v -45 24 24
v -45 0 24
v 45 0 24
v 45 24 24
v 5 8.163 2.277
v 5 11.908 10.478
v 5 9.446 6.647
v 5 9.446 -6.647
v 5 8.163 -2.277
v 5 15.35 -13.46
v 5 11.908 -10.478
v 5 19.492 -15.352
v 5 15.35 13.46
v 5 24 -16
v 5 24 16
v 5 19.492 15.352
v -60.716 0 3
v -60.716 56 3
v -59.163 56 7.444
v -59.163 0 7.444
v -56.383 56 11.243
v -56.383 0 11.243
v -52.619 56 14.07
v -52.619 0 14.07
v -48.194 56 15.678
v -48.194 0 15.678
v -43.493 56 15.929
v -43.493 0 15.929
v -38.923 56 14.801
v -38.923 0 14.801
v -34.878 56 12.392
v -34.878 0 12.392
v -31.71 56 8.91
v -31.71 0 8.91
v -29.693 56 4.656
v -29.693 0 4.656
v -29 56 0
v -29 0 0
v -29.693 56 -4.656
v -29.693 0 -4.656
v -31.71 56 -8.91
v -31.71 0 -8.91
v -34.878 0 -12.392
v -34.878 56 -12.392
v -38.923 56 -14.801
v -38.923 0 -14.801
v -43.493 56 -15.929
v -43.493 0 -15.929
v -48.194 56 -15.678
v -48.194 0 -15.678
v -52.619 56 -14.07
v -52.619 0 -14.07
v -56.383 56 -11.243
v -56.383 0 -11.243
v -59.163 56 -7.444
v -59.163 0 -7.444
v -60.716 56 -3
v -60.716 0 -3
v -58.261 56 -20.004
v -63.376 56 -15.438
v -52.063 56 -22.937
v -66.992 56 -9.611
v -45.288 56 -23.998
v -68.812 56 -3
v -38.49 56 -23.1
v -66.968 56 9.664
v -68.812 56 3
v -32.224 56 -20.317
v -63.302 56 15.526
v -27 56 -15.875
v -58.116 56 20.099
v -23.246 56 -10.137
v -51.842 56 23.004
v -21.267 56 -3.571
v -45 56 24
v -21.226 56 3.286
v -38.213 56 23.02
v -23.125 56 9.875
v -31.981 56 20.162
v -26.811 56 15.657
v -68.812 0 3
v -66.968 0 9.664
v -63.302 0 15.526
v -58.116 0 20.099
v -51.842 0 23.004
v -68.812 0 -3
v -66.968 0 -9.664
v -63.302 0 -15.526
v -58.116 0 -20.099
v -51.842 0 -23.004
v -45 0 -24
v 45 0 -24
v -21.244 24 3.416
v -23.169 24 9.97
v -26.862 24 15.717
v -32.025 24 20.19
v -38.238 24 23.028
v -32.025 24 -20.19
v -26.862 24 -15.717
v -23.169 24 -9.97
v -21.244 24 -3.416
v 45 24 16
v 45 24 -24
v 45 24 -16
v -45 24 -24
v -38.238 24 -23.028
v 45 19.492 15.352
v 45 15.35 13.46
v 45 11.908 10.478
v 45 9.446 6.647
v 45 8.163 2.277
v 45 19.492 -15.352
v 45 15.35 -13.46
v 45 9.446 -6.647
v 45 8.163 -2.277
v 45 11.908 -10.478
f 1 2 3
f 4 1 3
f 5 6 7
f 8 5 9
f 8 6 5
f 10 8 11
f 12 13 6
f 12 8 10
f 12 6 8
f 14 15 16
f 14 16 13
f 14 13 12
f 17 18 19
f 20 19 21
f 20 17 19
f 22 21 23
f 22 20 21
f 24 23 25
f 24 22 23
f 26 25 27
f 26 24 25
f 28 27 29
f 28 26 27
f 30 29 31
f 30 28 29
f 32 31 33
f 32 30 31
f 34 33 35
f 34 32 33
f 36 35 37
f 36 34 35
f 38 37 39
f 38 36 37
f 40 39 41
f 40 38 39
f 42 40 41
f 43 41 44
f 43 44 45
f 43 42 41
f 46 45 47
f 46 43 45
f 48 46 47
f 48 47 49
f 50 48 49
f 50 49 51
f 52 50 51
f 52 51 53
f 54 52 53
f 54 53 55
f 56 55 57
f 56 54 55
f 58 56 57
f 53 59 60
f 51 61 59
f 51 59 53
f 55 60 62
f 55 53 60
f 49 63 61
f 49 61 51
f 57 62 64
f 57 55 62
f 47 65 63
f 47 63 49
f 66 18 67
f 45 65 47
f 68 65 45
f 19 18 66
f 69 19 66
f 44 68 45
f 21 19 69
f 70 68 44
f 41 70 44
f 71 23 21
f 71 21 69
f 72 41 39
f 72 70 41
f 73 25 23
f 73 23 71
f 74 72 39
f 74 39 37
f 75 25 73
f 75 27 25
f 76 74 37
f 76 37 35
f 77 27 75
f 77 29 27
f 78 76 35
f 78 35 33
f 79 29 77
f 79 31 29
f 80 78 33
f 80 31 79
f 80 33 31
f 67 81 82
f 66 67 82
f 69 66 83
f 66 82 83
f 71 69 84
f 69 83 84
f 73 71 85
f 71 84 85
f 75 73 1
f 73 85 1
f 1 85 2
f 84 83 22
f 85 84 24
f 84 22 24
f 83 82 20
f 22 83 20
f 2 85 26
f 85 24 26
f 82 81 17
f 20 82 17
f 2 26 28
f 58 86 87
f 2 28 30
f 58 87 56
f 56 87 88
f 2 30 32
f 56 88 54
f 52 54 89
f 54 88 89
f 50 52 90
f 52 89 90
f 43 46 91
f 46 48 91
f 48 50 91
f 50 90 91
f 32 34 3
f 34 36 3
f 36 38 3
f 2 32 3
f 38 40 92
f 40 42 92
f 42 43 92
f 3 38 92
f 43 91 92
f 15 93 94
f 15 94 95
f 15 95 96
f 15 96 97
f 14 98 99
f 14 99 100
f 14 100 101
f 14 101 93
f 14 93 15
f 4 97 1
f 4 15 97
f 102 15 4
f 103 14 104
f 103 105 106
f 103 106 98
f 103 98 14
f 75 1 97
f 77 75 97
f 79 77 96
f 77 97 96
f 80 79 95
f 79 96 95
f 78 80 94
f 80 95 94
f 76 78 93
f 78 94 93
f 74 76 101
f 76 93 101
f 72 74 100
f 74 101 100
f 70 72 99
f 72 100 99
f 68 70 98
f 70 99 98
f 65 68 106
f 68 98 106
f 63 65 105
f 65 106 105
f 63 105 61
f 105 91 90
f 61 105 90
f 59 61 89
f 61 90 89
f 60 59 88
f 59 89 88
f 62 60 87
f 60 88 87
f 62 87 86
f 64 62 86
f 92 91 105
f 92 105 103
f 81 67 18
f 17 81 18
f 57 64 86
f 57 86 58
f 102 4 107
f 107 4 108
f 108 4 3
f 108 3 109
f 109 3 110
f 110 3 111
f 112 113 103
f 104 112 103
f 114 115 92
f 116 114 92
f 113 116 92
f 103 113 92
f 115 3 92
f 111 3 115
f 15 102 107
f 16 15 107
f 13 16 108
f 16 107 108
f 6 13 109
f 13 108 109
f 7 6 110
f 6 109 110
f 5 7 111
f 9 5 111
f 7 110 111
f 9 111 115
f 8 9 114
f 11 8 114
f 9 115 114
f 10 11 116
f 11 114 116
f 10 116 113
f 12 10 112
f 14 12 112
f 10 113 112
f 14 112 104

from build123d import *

# Parameters (mm, degrees)
SKETCH1_W                = 90
SKETCH1_H                = 48
BOSS_EXTRUDE1_DEPTH      = 24
SKETCH8_R                = 16
CUT_EXTRUDE1_DEPTH       = 40
BOSS_EXTRUDE2_DEPTH      = 32
BOSS_EXTRUDE2_DEPTH_BACK = 24
SKETCH9_R                = 24
SKETCH9_R_2              = 16
CUT_EXTRUDE2_DEPTH       = 32
CUT_EXTRUDE2_DEPTH_BACK  = 24
SKETCH10_R               = 16
SKETCH11_W               = 22
SKETCH11_H               = 6
CUT_EXTRUDE3_DEPTH       = 93.048900048


with BuildPart() as part:
    # Sketch1 → Boss-Extrude1 (new body)
    with BuildSketch(Plane(origin=(0, 0, 0), x_dir=(1, 0, 0), z_dir=(0, 1, 0))):
        Rectangle(SKETCH1_W, SKETCH1_H)
    extrude(amount=BOSS_EXTRUDE1_DEPTH)

    # Sketch8 → Cut-Extrude1 (cut)
    with BuildSketch(Plane(origin=(45, 0, 0), x_dir=(0, 0, -1), z_dir=(1, 0, 0))):
        with Locations((0, 24)):
            Circle(SKETCH8_R)
    extrude(amount=-CUT_EXTRUDE1_DEPTH, mode=Mode.SUBTRACT)

    # Sketch9 → Boss-Extrude2 (add, two sides: drawn at the far end of the back side and taken through both)
    with BuildSketch(Plane(origin=(0, 24, 0), x_dir=(1, 0, 0), z_dir=(0, 1, 0)).offset(-BOSS_EXTRUDE2_DEPTH_BACK)):
        with Locations(Location((-45, 0, 0), (0, 0, 270))):
            Circle(SKETCH9_R)
        with Locations(Location((-45, 0, 0), (0, 0, 270))):
            Circle(SKETCH9_R_2, mode=Mode.SUBTRACT)
    extrude(amount=BOSS_EXTRUDE2_DEPTH + BOSS_EXTRUDE2_DEPTH_BACK)

    # Sketch10 → Cut-Extrude2 (cut, two sides: drawn at the far end of the back side and taken through both)
    with BuildSketch(Plane(origin=(0, 24, 0), x_dir=(1, 0, 0), z_dir=(0, 1, 0)).offset(-CUT_EXTRUDE2_DEPTH_BACK)):
        with Locations(Location((-45, 0, 0), (0, 0, 270))):
            Circle(SKETCH10_R)
    extrude(amount=CUT_EXTRUDE2_DEPTH + CUT_EXTRUDE2_DEPTH_BACK, mode=Mode.SUBTRACT)

    # Sketch11 → Cut-Extrude3 (cut, through all)
    with BuildSketch(Plane(origin=(0, 56, 0), x_dir=(1, 0, 0), z_dir=(0, 1, 0))):
        with Locations((-69, 0)):
            Rectangle(SKETCH11_W, SKETCH11_H)
    extrude(amount=-CUT_EXTRUDE3_DEPTH, mode=Mode.SUBTRACT)


solid = part.part
